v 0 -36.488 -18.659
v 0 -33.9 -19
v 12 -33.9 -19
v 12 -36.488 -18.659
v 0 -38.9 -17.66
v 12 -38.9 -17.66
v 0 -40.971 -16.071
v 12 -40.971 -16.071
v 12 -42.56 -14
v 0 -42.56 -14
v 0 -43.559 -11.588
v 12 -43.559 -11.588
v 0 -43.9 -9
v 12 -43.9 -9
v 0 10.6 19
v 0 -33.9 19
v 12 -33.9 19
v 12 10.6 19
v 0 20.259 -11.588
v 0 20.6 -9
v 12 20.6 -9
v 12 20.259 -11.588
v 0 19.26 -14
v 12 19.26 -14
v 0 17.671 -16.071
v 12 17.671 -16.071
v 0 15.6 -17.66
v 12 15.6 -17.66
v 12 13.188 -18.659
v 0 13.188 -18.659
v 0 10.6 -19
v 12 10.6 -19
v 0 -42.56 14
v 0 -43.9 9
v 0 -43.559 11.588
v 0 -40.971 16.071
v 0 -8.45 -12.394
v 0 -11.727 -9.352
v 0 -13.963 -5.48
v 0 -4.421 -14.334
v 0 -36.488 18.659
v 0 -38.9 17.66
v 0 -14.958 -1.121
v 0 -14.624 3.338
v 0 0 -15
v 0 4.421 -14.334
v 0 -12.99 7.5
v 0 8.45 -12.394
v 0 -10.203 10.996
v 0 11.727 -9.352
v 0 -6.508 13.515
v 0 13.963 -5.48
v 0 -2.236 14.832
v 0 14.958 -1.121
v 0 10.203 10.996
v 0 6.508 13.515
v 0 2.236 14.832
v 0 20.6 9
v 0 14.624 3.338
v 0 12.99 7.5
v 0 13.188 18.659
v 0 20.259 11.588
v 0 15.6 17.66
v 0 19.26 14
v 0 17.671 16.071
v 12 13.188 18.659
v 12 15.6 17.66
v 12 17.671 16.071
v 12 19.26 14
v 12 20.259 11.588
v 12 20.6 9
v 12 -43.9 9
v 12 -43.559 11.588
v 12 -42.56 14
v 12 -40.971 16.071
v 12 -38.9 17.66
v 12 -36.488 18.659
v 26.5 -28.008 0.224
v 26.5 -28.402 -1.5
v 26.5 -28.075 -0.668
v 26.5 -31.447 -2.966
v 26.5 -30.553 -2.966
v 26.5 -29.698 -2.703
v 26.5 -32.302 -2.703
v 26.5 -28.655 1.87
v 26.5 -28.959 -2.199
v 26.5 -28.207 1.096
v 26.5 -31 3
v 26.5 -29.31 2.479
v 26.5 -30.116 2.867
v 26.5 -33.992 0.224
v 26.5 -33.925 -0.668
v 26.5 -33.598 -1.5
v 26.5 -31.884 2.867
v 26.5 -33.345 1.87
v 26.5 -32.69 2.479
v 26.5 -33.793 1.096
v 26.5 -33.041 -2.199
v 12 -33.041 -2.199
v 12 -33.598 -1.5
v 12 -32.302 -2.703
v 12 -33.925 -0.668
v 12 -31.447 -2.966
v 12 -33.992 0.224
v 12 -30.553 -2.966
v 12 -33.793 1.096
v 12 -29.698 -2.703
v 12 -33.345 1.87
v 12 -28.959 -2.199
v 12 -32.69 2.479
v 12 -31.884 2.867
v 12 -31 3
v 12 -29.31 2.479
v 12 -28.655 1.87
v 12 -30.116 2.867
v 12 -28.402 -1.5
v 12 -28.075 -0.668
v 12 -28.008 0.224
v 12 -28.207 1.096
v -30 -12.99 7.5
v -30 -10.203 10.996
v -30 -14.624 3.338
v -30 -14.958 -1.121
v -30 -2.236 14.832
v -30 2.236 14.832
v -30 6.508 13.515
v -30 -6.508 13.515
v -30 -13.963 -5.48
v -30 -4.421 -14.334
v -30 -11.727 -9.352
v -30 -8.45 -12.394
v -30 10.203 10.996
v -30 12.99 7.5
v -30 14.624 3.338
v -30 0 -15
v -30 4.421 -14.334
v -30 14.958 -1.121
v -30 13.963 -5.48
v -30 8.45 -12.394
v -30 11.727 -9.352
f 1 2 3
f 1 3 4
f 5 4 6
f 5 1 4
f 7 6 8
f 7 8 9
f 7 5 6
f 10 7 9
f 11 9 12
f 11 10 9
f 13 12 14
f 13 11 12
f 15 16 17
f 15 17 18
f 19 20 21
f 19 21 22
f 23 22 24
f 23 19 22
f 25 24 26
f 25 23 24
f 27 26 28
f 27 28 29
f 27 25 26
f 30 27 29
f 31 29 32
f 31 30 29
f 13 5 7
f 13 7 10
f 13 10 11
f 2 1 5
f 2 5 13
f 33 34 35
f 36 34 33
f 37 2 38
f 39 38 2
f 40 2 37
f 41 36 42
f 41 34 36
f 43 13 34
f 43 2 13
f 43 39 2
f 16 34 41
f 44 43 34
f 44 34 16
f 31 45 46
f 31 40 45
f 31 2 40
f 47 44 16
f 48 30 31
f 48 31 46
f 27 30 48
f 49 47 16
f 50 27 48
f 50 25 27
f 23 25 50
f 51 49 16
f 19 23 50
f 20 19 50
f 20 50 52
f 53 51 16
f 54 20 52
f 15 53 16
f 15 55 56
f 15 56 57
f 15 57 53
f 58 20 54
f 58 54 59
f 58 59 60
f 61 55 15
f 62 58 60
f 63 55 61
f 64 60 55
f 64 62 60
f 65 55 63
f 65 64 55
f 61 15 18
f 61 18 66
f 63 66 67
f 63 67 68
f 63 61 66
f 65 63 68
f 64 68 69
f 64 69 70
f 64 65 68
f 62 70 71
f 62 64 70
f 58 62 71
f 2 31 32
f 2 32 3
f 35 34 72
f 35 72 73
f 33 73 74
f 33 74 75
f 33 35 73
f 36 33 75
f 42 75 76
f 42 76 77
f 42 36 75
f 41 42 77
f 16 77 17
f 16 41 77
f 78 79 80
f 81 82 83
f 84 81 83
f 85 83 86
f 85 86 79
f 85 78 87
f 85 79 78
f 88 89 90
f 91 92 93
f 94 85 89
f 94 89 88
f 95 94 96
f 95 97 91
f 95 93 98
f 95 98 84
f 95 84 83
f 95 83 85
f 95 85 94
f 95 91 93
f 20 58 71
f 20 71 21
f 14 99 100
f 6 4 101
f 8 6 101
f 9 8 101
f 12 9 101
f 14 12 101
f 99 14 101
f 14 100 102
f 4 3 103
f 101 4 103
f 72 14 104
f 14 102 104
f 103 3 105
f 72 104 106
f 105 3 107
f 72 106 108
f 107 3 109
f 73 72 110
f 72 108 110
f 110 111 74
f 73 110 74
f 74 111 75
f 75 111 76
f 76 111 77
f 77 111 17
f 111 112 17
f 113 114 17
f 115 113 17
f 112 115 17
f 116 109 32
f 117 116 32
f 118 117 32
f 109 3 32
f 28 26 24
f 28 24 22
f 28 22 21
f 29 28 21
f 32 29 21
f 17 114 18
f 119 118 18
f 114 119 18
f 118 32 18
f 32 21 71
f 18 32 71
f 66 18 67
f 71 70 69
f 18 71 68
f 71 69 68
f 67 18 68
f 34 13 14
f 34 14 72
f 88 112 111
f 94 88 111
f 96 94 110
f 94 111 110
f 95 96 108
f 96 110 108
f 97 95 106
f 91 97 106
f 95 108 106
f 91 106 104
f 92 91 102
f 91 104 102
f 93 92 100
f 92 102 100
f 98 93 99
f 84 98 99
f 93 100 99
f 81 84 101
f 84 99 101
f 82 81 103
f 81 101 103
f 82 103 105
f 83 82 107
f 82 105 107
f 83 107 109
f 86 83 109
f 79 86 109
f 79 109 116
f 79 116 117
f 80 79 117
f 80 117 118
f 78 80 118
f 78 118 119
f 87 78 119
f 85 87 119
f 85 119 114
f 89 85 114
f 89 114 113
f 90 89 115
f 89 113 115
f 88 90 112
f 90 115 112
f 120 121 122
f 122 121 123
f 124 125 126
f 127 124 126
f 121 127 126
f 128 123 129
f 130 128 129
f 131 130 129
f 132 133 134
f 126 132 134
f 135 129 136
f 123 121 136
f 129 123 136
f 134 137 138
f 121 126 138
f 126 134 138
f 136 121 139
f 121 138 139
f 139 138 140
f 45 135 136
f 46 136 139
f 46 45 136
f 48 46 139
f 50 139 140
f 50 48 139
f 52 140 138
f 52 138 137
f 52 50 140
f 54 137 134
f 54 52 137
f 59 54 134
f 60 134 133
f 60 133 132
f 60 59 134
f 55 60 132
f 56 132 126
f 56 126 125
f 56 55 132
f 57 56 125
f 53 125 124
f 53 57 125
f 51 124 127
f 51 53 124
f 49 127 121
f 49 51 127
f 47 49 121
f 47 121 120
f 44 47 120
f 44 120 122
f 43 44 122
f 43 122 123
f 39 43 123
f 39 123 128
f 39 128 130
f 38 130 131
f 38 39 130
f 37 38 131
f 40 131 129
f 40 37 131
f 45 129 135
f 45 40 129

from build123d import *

# Parameters (mm, degrees)
SKETCH_1_R      = 15
EXTRUDE_1_DEPTH = 30
EXTRUDE_2_DEPTH = 12
SKETCH_9_R      = 3
EXTRUDE_3_DEPTH = 14.5


with BuildPart() as part:
    # 草图1 → 凸台-拉伸1 (new body)
    with BuildSketch(Plane(origin=(0, 0, 0), x_dir=(0, 0, -1), z_dir=(1, 0, 0))):
        Circle(SKETCH_1_R)
    extrude(amount=-EXTRUDE_1_DEPTH)

    # 草图8 → 凸台-拉伸2 (add)
    with BuildSketch(Plane(origin=(0, 0, 0), x_dir=(0, 0, -1), z_dir=(1, 0, 0))):
        with BuildLine():
            Line((19, 10.6), (19, -33.9))
            ThreePointArc((19, -33.9), (16.071067812, -40.971067812), (9, -43.9))
            Line((9, -43.9), (-9, -43.9))
            ThreePointArc((-9, -43.9), (-16.071067812, -40.971067812), (-19, -33.9))
            Line((-19, -33.9), (-19, 10.6))
            ThreePointArc((-19, 10.6), (-16.071067812, 17.671067812), (-9, 20.6))
            Line((-9, 20.6), (9, 20.6))
            ThreePointArc((9, 20.6), (16.071067812, 17.671067812), (19, 10.6))
        make_face()
    extrude(amount=EXTRUDE_2_DEPTH)

    # 草图9 → 凸台-拉伸3 (add)
    with BuildSketch(Plane(origin=(12, 0, 0), x_dir=(0, 0, -1), z_dir=(1, 0, 0))):
        with Locations(Location((0, -31, 0), (0, 0, 180))):
            Circle(SKETCH_9_R)
    extrude(amount=EXTRUDE_3_DEPTH)


solid = part.part
